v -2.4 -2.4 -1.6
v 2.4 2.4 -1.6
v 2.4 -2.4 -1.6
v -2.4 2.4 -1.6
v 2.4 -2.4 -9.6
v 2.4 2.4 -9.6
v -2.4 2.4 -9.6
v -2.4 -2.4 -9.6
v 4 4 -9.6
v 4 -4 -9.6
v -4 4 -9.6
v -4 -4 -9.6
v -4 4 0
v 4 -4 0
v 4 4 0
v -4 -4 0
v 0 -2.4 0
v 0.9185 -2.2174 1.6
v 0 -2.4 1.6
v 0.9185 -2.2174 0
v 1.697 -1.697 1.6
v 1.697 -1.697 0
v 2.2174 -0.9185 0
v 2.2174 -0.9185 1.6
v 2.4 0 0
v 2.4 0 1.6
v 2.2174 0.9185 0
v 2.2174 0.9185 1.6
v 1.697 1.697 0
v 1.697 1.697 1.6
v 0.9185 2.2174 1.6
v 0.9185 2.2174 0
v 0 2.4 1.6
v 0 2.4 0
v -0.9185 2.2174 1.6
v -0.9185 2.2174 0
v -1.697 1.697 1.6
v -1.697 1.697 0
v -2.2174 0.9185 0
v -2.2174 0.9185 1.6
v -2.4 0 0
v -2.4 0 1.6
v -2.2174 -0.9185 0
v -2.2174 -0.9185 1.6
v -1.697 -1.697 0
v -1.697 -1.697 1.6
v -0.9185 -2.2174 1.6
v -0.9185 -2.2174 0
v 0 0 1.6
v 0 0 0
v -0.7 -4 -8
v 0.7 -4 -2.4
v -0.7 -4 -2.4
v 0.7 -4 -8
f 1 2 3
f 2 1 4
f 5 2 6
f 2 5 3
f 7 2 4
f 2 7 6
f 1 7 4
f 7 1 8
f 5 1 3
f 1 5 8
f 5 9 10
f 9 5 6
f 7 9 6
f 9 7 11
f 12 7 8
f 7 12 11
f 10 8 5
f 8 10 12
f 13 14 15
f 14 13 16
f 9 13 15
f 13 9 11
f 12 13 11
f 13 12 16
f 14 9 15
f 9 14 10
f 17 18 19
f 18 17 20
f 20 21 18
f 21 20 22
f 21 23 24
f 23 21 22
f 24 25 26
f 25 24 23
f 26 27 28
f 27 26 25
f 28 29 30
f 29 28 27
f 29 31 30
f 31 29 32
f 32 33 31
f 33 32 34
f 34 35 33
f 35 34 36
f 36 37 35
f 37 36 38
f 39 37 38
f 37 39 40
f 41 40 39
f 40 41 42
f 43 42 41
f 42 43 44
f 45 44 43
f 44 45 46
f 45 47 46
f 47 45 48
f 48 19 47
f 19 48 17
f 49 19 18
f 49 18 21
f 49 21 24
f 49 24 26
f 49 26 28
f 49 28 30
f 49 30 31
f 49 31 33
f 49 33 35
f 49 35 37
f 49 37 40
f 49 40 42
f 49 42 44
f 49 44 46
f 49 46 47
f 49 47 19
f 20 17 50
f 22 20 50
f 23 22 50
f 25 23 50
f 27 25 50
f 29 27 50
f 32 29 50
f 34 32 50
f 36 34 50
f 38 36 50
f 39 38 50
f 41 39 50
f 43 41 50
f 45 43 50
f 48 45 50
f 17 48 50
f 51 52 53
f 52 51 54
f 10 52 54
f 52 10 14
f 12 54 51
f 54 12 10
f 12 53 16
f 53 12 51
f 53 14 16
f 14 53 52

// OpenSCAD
// file: ../p/4-4edge.scad
use <../lib.scad>
function ldraw_lib__4_4edge() = [
// 0 Circle 1.0
// 0 Name: 4-4edge.dat
// 0 Author: James Jessiman
// 0 !LDRAW_ORG Primitive UPDATE 2017-01
// 0 !LICENSE Licensed under CC BY 2.0 and CC BY 4.0 : see CAreadme.txt
// 
// 0 BFC CERTIFY CCW
  [0,"BFC","CERTIFY"],
  [0,"BFC","CCW"],
// 
// 0 !HISTORY 1998-12-15 [PTadmin] Official Update 1998-10
// 0 !HISTORY 2005-12-28 [PTadmin] Official Update 2005-01
// 0 !HISTORY 2007-06-24 [PTadmin] Header formatted for Contributor Agreement
// 0 !HISTORY 2008-07-01 [PTadmin] Official Update 2008-01
// 0 !HISTORY 2017-01-15 [Steffen] BFCed
// 0 !HISTORY 2017-12-30 [PTadmin] Official Update 2017-01
// 
// 
// 2 24 1 0 0 0.9239 0 0.3827
  [2,24,1,0,0,0.9239,0,0.3827],
// 2 24 0.9239 0 0.3827 0.7071 0 0.7071
  [2,24,0.9239,0,0.3827,0.7071,0,0.7071],
// 2 24 0.7071 0 0.7071 0.3827 0 0.9239
  [2,24,0.7071,0,0.7071,0.3827,0,0.9239],
// 2 24 0.3827 0 0.9239 0 0 1
  [2,24,0.3827,0,0.9239,0,0,1],
// 2 24 0 0 1 -0.3827 0 0.9239
  [2,24,0,0,1,-0.3827,0,0.9239],
// 2 24 -0.3827 0 0.9239 -0.7071 0 0.7071
  [2,24,-0.3827,0,0.9239,-0.7071,0,0.7071],
// 2 24 -0.7071 0 0.7071 -0.9239 0 0.3827
  [2,24,-0.7071,0,0.7071,-0.9239,0,0.3827],
// 2 24 -0.9239 0 0.3827 -1 0 -0
  [2,24,-0.9239,0,0.3827,-1,0,-0],
// 2 24 -1 0 -0 -0.9239 0 -0.3827
  [2,24,-1,0,-0,-0.9239,0,-0.3827],
// 2 24 -0.9239 0 -0.3827 -0.7071 0 -0.7071
  [2,24,-0.9239,0,-0.3827,-0.7071,0,-0.7071],
// 2 24 -0.7071 0 -0.7071 -0.3827 0 -0.9239
  [2,24,-0.7071,0,-0.7071,-0.3827,0,-0.9239],
// 2 24 -0.3827 0 -0.9239 0 0 -1
  [2,24,-0.3827,0,-0.9239,0,0,-1],
// 2 24 0 0 -1 0.3827 0 -0.9239
  [2,24,0,0,-1,0.3827,0,-0.9239],
// 2 24 0.3827 0 -0.9239 0.7071 0 -0.7071
  [2,24,0.3827,0,-0.9239,0.7071,0,-0.7071],
// 2 24 0.7071 0 -0.7071 0.9239 0 -0.3827
  [2,24,0.7071,0,-0.7071,0.9239,0,-0.3827],
// 2 24 0.9239 0 -0.3827 1 0 0
  [2,24,0.9239,0,-0.3827,1,0,0],
];
module ldraw_lib__4_4edge(step=0, col=false, unit=2/5, alt=false, line=0.2, solid=!$preview)
    makepoly(ldraw_lib__4_4edge(), step=step, col=col, unit=unit, alt=alt, line=line, solid=solid);
ldraw_lib__4_4edge(line=0.2);
// file: ../p/4-4disc.scad
use <../lib.scad>
function ldraw_lib__4_4disc() = [
// 0 Disc 1.0
// 0 Name: 4-4disc.dat
// 0 Author: James Jessiman
// 0 !LDRAW_ORG Primitive UPDATE 2002-02
// 0 !LICENSE Licensed under CC BY 2.0 and CC BY 4.0 : see CAreadme.txt
// 
// 0 BFC CERTIFY CCW
  [0,"BFC","CERTIFY"],
  [0,"BFC","CCW"],
// 
// 0 !HISTORY 1998-12-15 [PTadmin] Official Update 1998-10
// 0 !HISTORY 2002-03-23 [sbliss] Added BFC statement
// 0 !HISTORY 2002-04-25 [PTadmin] Official Update 2002-02
// 0 !HISTORY 2007-06-24 [PTadmin] Header formatted for Contributor Agreement
// 0 !HISTORY 2008-07-01 [PTadmin] Official Update 2008-01
// 
// 
// 3 16 0 0 0 1 0 0 0.9239 0 0.3827
  [3,16,0,0,0,1,0,0,0.9239,0,0.3827],
// 3 16 0 0 0 0.9239 0 0.3827 0.7071 0 0.7071
  [3,16,0,0,0,0.9239,0,0.3827,0.7071,0,0.7071],
// 3 16 0 0 0 0.7071 0 0.7071 0.3827 0 0.9239
  [3,16,0,0,0,0.7071,0,0.7071,0.3827,0,0.9239],
// 3 16 0 0 0 0.3827 0 0.9239 0 0 1
  [3,16,0,0,0,0.3827,0,0.9239,0,0,1],
// 3 16 0 0 0 0 0 1 -0.3827 0 0.9239
  [3,16,0,0,0,0,0,1,-0.3827,0,0.9239],
// 3 16 0 0 0 -0.3827 0 0.9239 -0.7071 0 0.7071
  [3,16,0,0,0,-0.3827,0,0.9239,-0.7071,0,0.7071],
// 3 16 0 0 0 -0.7071 0 0.7071 -0.9239 0 0.3827
  [3,16,0,0,0,-0.7071,0,0.7071,-0.9239,0,0.3827],
// 3 16 0 0 0 -0.9239 0 0.3827 -1 0 -0
  [3,16,0,0,0,-0.9239,0,0.3827,-1,0,-0],
// 3 16 0 0 0 -1 0 -0 -0.9239 0 -0.3827
  [3,16,0,0,0,-1,0,-0,-0.9239,0,-0.3827],
// 3 16 0 0 0 -0.9239 0 -0.3827 -0.7071 0 -0.7071
  [3,16,0,0,0,-0.9239,0,-0.3827,-0.7071,0,-0.7071],
// 3 16 0 0 0 -0.7071 0 -0.7071 -0.3827 0 -0.9239
  [3,16,0,0,0,-0.7071,0,-0.7071,-0.3827,0,-0.9239],
// 3 16 0 0 0 -0.3827 0 -0.9239 0 0 -1
  [3,16,0,0,0,-0.3827,0,-0.9239,0,0,-1],
// 3 16 0 0 0 0 0 -1 0.3827 0 -0.9239
  [3,16,0,0,0,0,0,-1,0.3827,0,-0.9239],
// 3 16 0 0 0 0.3827 0 -0.9239 0.7071 0 -0.7071
  [3,16,0,0,0,0.3827,0,-0.9239,0.7071,0,-0.7071],
// 3 16 0 0 0 0.7071 0 -0.7071 0.9239 0 -0.3827
  [3,16,0,0,0,0.7071,0,-0.7071,0.9239,0,-0.3827],
// 3 16 0 0 0 0.9239 0 -0.3827 1 0 0
  [3,16,0,0,0,0.9239,0,-0.3827,1,0,0],
// 0
];
module ldraw_lib__4_4disc(step=0, col=false, unit=2/5, alt=false, line=0.2, solid=!$preview)
    makepoly(ldraw_lib__4_4disc(), step=step, col=col, unit=unit, alt=alt, line=line, solid=solid);
ldraw_lib__4_4disc(line=0.2);
// file: ../p/4-4cyli.scad
use <../lib.scad>
$fa=1; $fs=0.2;
function ldraw_lib__4_4cyli(realsolid=false) = [
// 0 Cylinder 1.0
// 0 Name: 4-4cyli.dat
// 0 Author: James Jessiman
// 0 !LDRAW_ORG Primitive UPDATE 2005-01
// 0 !LICENSE Licensed under CC BY 2.0 and CC BY 4.0 : see CAreadme.txt
// 
// 0 BFC CERTIFY CCW
  [0,"BFC","CERTIFY"],
  [0,"BFC","CCW"],
// 
// 0 !HISTORY 1998-12-15 [PTadmin] Official Update 1998-10
// 0 !HISTORY 2002-03-23 [sbliss] Added BFC statement; merged headers from files in distributions LDraw 0.27 and Complete.
// 0 !HISTORY 2002-04-25 [PTadmin] Official Update 2002-02
// 0 !HISTORY 2004-12-14 [guyvivan] BFC CCW
// 0 !HISTORY 2005-12-28 [PTadmin] Official Update 2005-01
// 0 !HISTORY 2007-06-24 [PTadmin] Header formatted for Contributor Agreement
// 0 !HISTORY 2008-07-01 [PTadmin] Official Update 2008-01
// 
// 
// 4 16 1 1 0 0.9239 1 0.3827 0.9239 0 0.3827 1 0 0
  [4,16,1,1,0,0.9239,1,0.3827,0.9239,0,0.3827,1,0,0],
// 5 24 1 0 0 1 1 0 0.9239 0 0.3827 0.9239 0 -0.3827
  [5,24,1,0,0,1,1,0,0.9239,0,0.3827,0.9239,0,-0.3827],
// 4 16 0.9239 1 0.3827 0.7071 1 0.7071 0.7071 0 0.7071 0.9239 0 0.3827
  [4,16,0.9239,1,0.3827,0.7071,1,0.7071,0.7071,0,0.7071,0.9239,0,0.3827],
// 5 24 0.9239 0 0.3827 0.9239 1 0.3827 0.7071 0 0.7071 1 0 0
  [5,24,0.9239,0,0.3827,0.9239,1,0.3827,0.7071,0,0.7071,1,0,0],
// 4 16 0.7071 1 0.7071 0.3827 1 0.9239 0.3827 0 0.9239 0.7071 0 0.7071
  [4,16,0.7071,1,0.7071,0.3827,1,0.9239,0.3827,0,0.9239,0.7071,0,0.7071],
// 5 24 0.7071 0 0.7071 0.7071 1 0.7071 0.3827 0 0.9239 0.9239 0 0.3827
  [5,24,0.7071,0,0.7071,0.7071,1,0.7071,0.3827,0,0.9239,0.9239,0,0.3827],
// 4 16 0.3827 1 0.9239 0 1 1 0 0 1 0.3827 0 0.9239
  [4,16,0.3827,1,0.9239,0,1,1,0,0,1,0.3827,0,0.9239],
// 5 24 0.3827 0 0.9239 0.3827 1 0.9239 0 0 1 0.7071 0 0.7071
  [5,24,0.3827,0,0.9239,0.3827,1,0.9239,0,0,1,0.7071,0,0.7071],
// 4 16 0 1 1 -0.3827 1 0.9239 -0.3827 0 0.9239 0 0 1
  [4,16,0,1,1,-0.3827,1,0.9239,-0.3827,0,0.9239,0,0,1],
// 5 24 0 0 1 0 1 1 -0.3827 0 0.9239 0.3827 0 0.9239
  [5,24,0,0,1,0,1,1,-0.3827,0,0.9239,0.3827,0,0.9239],
// 4 16 -0.3827 1 0.9239 -0.7071 1 0.7071 -0.7071 0 0.7071 -0.3827 0 0.9239
  [4,16,-0.3827,1,0.9239,-0.7071,1,0.7071,-0.7071,0,0.7071,-0.3827,0,0.9239],
// 5 24 -0.3827 0 0.9239 -0.3827 1 0.9239 -0.7071 0 0.7071 0 0 1
  [5,24,-0.3827,0,0.9239,-0.3827,1,0.9239,-0.7071,0,0.7071,0,0,1],
// 4 16 -0.7071 1 0.7071 -0.9239 1 0.3827 -0.9239 0 0.3827 -0.7071 0 0.7071
  [4,16,-0.7071,1,0.7071,-0.9239,1,0.3827,-0.9239,0,0.3827,-0.7071,0,0.7071],
// 5 24 -0.7071 0 0.7071 -0.7071 1 0.7071 -0.9239 0 0.3827 -0.3827 0 0.9239
  [5,24,-0.7071,0,0.7071,-0.7071,1,0.7071,-0.9239,0,0.3827,-0.3827,0,0.9239],
// 4 16 -0.9239 1 0.3827 -1 1 0 -1 0 0 -0.9239 0 0.3827
  [4,16,-0.9239,1,0.3827,-1,1,0,-1,0,0,-0.9239,0,0.3827],
// 5 24 -0.9239 0 0.3827 -0.9239 1 0.3827 -1 0 0 -0.7071 0 0.7071
  [5,24,-0.9239,0,0.3827,-0.9239,1,0.3827,-1,0,0,-0.7071,0,0.7071],
// 4 16 -1 1 0 -0.9239 1 -0.3827 -0.9239 0 -0.3827 -1 0 0
  [4,16,-1,1,0,-0.9239,1,-0.3827,-0.9239,0,-0.3827,-1,0,0],
// 5 24 -1 0 0 -1 1 0 -0.9239 0 -0.3827 -0.9239 0 0.3827
  [5,24,-1,0,0,-1,1,0,-0.9239,0,-0.3827,-0.9239,0,0.3827],
// 4 16 -0.9239 1 -0.3827 -0.7071 1 -0.7071 -0.7071 0 -0.7071 -0.9239 0 -0.3827
  [4,16,-0.9239,1,-0.3827,-0.7071,1,-0.7071,-0.7071,0,-0.7071,-0.9239,0,-0.3827],
// 5 24 -0.9239 0 -0.3827 -0.9239 1 -0.3827 -0.7071 0 -0.7071 -1 0 0
  [5,24,-0.9239,0,-0.3827,-0.9239,1,-0.3827,-0.7071,0,-0.7071,-1,0,0],
// 4 16 -0.7071 1 -0.7071 -0.3827 1 -0.9239 -0.3827 0 -0.9239 -0.7071 0 -0.7071
  [4,16,-0.7071,1,-0.7071,-0.3827,1,-0.9239,-0.3827,0,-0.9239,-0.7071,0,-0.7071],
// 5 24 -0.7071 0 -0.7071 -0.7071 1 -0.7071 -0.3827 0 -0.9239 -0.9239 0 -0.3827
  [5,24,-0.7071,0,-0.7071,-0.7071,1,-0.7071,-0.3827,0,-0.9239,-0.9239,0,-0.3827],
// 4 16 -0.3827 1 -0.9239 0 1 -1 0 0 -1 -0.3827 0 -0.9239
  [4,16,-0.3827,1,-0.9239,0,1,-1,0,0,-1,-0.3827,0,-0.9239],
// 5 24 -0.3827 0 -0.9239 -0.3827 1 -0.9239 0 0 -1 -0.7071 0 -0.7071
  [5,24,-0.3827,0,-0.9239,-0.3827,1,-0.9239,0,0,-1,-0.7071,0,-0.7071],
// 4 16 0 1 -1 0.3827 1 -0.9239 0.3827 0 -0.9239 0 0 -1
  [4,16,0,1,-1,0.3827,1,-0.9239,0.3827,0,-0.9239,0,0,-1],
// 5 24 0 0 -1 0 1 -1 0.3827 0 -0.9239 -0.3827 0 -0.9239
  [5,24,0,0,-1,0,1,-1,0.3827,0,-0.9239,-0.3827,0,-0.9239],
// 4 16 0.3827 1 -0.9239 0.7071 1 -0.7071 0.7071 0 -0.7071 0.3827 0 -0.9239
  [4,16,0.3827,1,-0.9239,0.7071,1,-0.7071,0.7071,0,-0.7071,0.3827,0,-0.9239],
// 5 24 0.3827 0 -0.9239 0.3827 1 -0.9239 0.7071 0 -0.7071 0 0 -1
  [5,24,0.3827,0,-0.9239,0.3827,1,-0.9239,0.7071,0,-0.7071,0,0,-1],
// 4 16 0.7071 1 -0.7071 0.9239 1 -0.3827 0.9239 0 -0.3827 0.7071 0 -0.7071
  [4,16,0.7071,1,-0.7071,0.9239,1,-0.3827,0.9239,0,-0.3827,0.7071,0,-0.7071],
// 5 24 0.7071 0 -0.7071 0.7071 1 -0.7071 0.9239 0 -0.3827 0.3827 0 -0.9239
  [5,24,0.7071,0,-0.7071,0.7071,1,-0.7071,0.9239,0,-0.3827,0.3827,0,-0.9239],
// 4 16 0.9239 1 -0.3827 1 1 0 1 0 0 0.9239 0 -0.3827
  [4,16,0.9239,1,-0.3827,1,1,0,1,0,0,0.9239,0,-0.3827],
// 5 24 0.9239 0 -0.3827 0.9239 1 -0.3827 1 0 0 0.7071 0 -0.7071
  [5,24,0.9239,0,-0.3827,0.9239,1,-0.3827,1,0,0,0.7071,0,-0.7071],
// 0
];
module ldraw_lib__4_4cyli(step=0, col=false, unit=2/5, alt=false, line=0.2, solid=!$preview)
    makepoly(ldraw_lib__4_4cyli(solid), step=step, col=col, unit=unit, alt=alt, line=line, solid=solid);
ldraw_lib__4_4cyli(line=0.2);
// file: ../p/stud.scad
use <../lib.scad>
use <4-4cyli.scad>
use <4-4disc.scad>
use <4-4edge.scad>
function ldraw_lib__stud() = [
// 0 Stud
// 0 Name: stud.dat
// 0 Author: James Jessiman
// 0 !LDRAW_ORG Primitive UPDATE 2012-01
// 0 !LICENSE Licensed under CC BY 4.0 : see CAreadme.txt
// 
// 0 BFC CERTIFY CCW
  [0,"BFC","CERTIFY"],
  [0,"BFC","CCW"],
// 
// 0 !HISTORY 2002-04-04 [sbliss] Modified for BFC compliance
// 0 !HISTORY 2002-04-25 [PTadmin] Official Update 2002-02
// 0 !HISTORY 2007-06-24 [PTadmin] Header formatted for Contributor Agreement
// 0 !HISTORY 2008-07-01 [PTadmin] Official Update 2008-01
// 0 !HISTORY 2012-02-16 [Philo] Changed to CCW
// 0 !HISTORY 2012-03-30 [PTadmin] Official Update 2012-01
// 
// 
// 1 16 0 0 0 6 0 0 0 1 0 0 0 6 4-4edge.dat
  [1,16,0,0,0,6,0,0,0,1,0,0,0,6, ldraw_lib__4_4edge()],
// 1 16 0 -4 0 6 0 0 0 1 0 0 0 6 4-4edge.dat
  [1,16,0,-4,0,6,0,0,0,1,0,0,0,6, ldraw_lib__4_4edge()],
// 1 16 0 0 0 6 0 0 0 -4 0 0 0 6 4-4cyli.dat
  [1,16,0,0,0,6,0,0,0,-4,0,0,0,6, ldraw_lib__4_4cyli()],
// 1 16 0 -4 0 6 0 0 0 1 0 0 0 6 4-4disc.dat
  [1,16,0,-4,0,6,0,0,0,1,0,0,0,6, ldraw_lib__4_4disc()],
  [-1,16,0,0,0,6,0,0,0,-1,0,0,0,6, ldraw_lib__4_4disc()],
];
module ldraw_lib__stud(step=0, col=false, unit=2/5, alt=false, line=0.2, solid=!$preview)
    makepoly(ldraw_lib__stud(), step=step, col=col, unit=unit, alt=alt, line=line, solid=solid);
ldraw_lib__stud(line=0.2);
// file: ../p/box5.scad
use <../lib.scad>
function ldraw_lib__box5() = [
// 0 Box with 5 Faces and All Edges
// 0 Name: box5.dat
// 0 Author: James Jessiman
// 0 !LDRAW_ORG Primitive UPDATE 2012-01
// 0 !LICENSE Licensed under CC BY 2.0 and CC BY 4.0 : see CAreadme.txt
// 
// 0 BFC CERTIFY CCW
  [0,"BFC","CERTIFY"],
  [0,"BFC","CCW"],
// 
// 0 !HISTORY 2002-04-03 [sbliss] Modified for BFC compliance
// 0 !HISTORY 2002-04-25 [PTadmin] Official Update 2002-02
// 0 !HISTORY 2007-06-24 [PTadmin] Header formatted for Contributor Agreement
// 0 !HISTORY 2008-07-01 [PTadmin] Official Update 2008-01
// 0 !HISTORY 2012-02-16 [Philo] Changed to CCW
// 0 !HISTORY 2012-03-30 [PTadmin] Official Update 2012-01
// 
// 
// 2 24 1 1 1 -1 1 1
  [2,24,1,1,1,-1,1,1],
// 2 24 -1 1 1 -1 1 -1
  [2,24,-1,1,1,-1,1,-1],
// 2 24 -1 1 -1 1 1 -1
  [2,24,-1,1,-1,1,1,-1],
// 2 24 1 1 -1 1 1 1
  [2,24,1,1,-1,1,1,1],
// 2 24 1 0 1 -1 0 1
  [2,24,1,0,1,-1,0,1],
// 2 24 -1 0 1 -1 0 -1
  [2,24,-1,0,1,-1,0,-1],
// 2 24 -1 0 -1 1 0 -1
  [2,24,-1,0,-1,1,0,-1],
// 2 24 1 0 -1 1 0 1
  [2,24,1,0,-1,1,0,1],
// 2 24 1 0 1 1 1 1
  [2,24,1,0,1,1,1,1],
// 2 24 -1 0 1 -1 1 1
  [2,24,-1,0,1,-1,1,1],
// 2 24 1 0 -1 1 1 -1
  [2,24,1,0,-1,1,1,-1],
// 2 24 -1 0 -1 -1 1 -1
  [2,24,-1,0,-1,-1,1,-1],
// 4 16 -1 1 1 1 1 1 1 1 -1 -1 1 -1
  [4,16,-1,1,1,1,1,1,1,1,-1,-1,1,-1],
// 4 16 -1 1 1 -1 0 1 1 0 1 1 1 1
  [4,16,-1,1,1,-1,0,1,1,0,1,1,1,1],
// 4 16 -1 1 -1 -1 0 -1 -1 0 1 -1 1 1
  [4,16,-1,1,-1,-1,0,-1,-1,0,1,-1,1,1],
// 4 16 1 1 -1 1 0 -1 -1 0 -1 -1 1 -1
  [4,16,1,1,-1,1,0,-1,-1,0,-1,-1,1,-1],
// 4 16 1 1 1 1 0 1 1 0 -1 1 1 -1
  [4,16,1,1,1,1,0,1,1,0,-1,1,1,-1],
];
makepoly(ldraw_lib__box5(), line=0.2);
// file: ../p/box4t.scad
use <../lib.scad>
function ldraw_lib__box4t() = [
// 0 Box with 4 Adjacent Faces and All Edges
// 0 Name: box4t.dat
// 0 Author: Tore Eriksson [Tore_Eriksson]
// 0 !LDRAW_ORG Primitive UPDATE 2003-02
// 0 !LICENSE Licensed under CC BY 2.0 and CC BY 4.0 : see CAreadme.txt
// 
// 0 BFC CERTIFY CCW
  [0,"BFC","CERTIFY"],
  [0,"BFC","CCW"],
// 
// 0 !HISTORY 1997-09-29 [PTadmin] Official Update 1997-15
// 0 !HISTORY 2002-08-31 [izanette] Modified with WINDZ for BFC compliance
// 0 !HISTORY 2003-08-01 [PTadmin] Official Update 2003-02
// 0 !HISTORY 2007-06-24 [PTadmin] Header formatted for Contributor Agreement
// 0 !HISTORY 2008-07-01 [PTadmin] Official Update 2008-01
// 
// 
// 2 24 1 1 1 -1 1 1
  [2,24,1,1,1,-1,1,1],
// 2 24 -1 1 1 -1 1 -1
  [2,24,-1,1,1,-1,1,-1],
// 2 24 -1 1 -1 1 1 -1
  [2,24,-1,1,-1,1,1,-1],
// 2 24 1 1 -1 1 1 1
  [2,24,1,1,-1,1,1,1],
// 2 24 1 0 1 -1 0 1
  [2,24,1,0,1,-1,0,1],
// 2 24 -1 0 1 -1 0 -1
  [2,24,-1,0,1,-1,0,-1],
// 2 24 -1 0 -1 1 0 -1
  [2,24,-1,0,-1,1,0,-1],
// 2 24 1 0 -1 1 0 1
  [2,24,1,0,-1,1,0,1],
// 2 24 1 0 1 1 1 1
  [2,24,1,0,1,1,1,1],
// 2 24 -1 0 1 -1 1 1
  [2,24,-1,0,1,-1,1,1],
// 2 24 1 0 -1 1 1 -1
  [2,24,1,0,-1,1,1,-1],
// 2 24 -1 0 -1 -1 1 -1
  [2,24,-1,0,-1,-1,1,-1],
// 4 16 1 1 1 1 1 -1 -1 1 -1 -1 1 1
  [4,16,1,1,1,1,1,-1,-1,1,-1,-1,1,1],
// 4 16 1 1 1 -1 1 1 -1 0 1 1 0 1
  [4,16,1,1,1,-1,1,1,-1,0,1,1,0,1],
// 4 16 -1 1 1 -1 1 -1 -1 0 -1 -1 0 1
  [4,16,-1,1,1,-1,1,-1,-1,0,-1,-1,0,1],
// 0 4 16 -1 1 -1 -1 0 -1 1 0 -1 1 1 -1
// 4 16 1 1 -1 1 1 1 1 0 1 1 0 -1
  [4,16,1,1,-1,1,1,1,1,0,1,1,0,-1],
// 0
];
makepoly(ldraw_lib__box4t(), line=0.2);
// file: s/3005s01.scad
use <../../lib.scad>
use <../../p/box4t.scad>
use <../../p/box5.scad>
use <../../p/stud.scad>
function ldraw_lib__s__3005s01() = [
// 0 ~Brick  1 x  1 without Front Face
// 0 Name: s\3005s01.dat
// 0 Author: John Riley [jriley]
// 0 !LDRAW_ORG Subpart UPDATE 2004-01
// 0 !LICENSE Licensed under CC BY 2.0 and CC BY 4.0 : see CAreadme.txt
// 
// 0 BFC CERTIFY CCW
  [0,"BFC","CERTIFY"],
  [0,"BFC","CCW"],
// 
// 0 !HISTORY 2003-09-07 [jriley] BFCed & Subfiled
// 0 !HISTORY 2004-03-02 [PTadmin] Official Update 2004-01
// 0 !HISTORY 2007-08-29 [PTadmin] Header formatted for Contributor Agreement
// 0 !HISTORY 2008-07-01 [PTadmin] Official Update 2008-01
// 
// 
// 0 BFC INVERTNEXT
  [0,"BFC","INVERTNEXT"],
// 1 16 0 24 0 0 0 6 0 -20 0 -6 0 0 box5.dat
  [1,16,0,24,0,0,0,6,0,-20,0,-6,0,0, ldraw_lib__box5()],
// 4 16 10 24 -10 6 24 -6 6 24 6 10 24 10
  [4,16,10,24,-10,6,24,-6,6,24,6,10,24,10],
// 4 16 10 24 10 6 24 6 -6 24 6 -10 24 10
  [4,16,10,24,10,6,24,6,-6,24,6,-10,24,10],
// 4 16 -10 24 10 -6 24 6 -6 24 -6 -10 24 -10
  [4,16,-10,24,10,-6,24,6,-6,24,-6,-10,24,-10],
// 4 16 -10 24 -10 -6 24 -6 6 24 -6 10 24 -10
  [4,16,-10,24,-10,-6,24,-6,6,24,-6,10,24,-10],
// 1 16 0 24 0 10 0 0 0 -24 0 0 0 10 box4t.dat
  [1,16,0,24,0,10,0,0,0,-24,0,0,0,10, ldraw_lib__box4t()],
// 1 16 0 0 0 0 0 1 0 1 0 -1 0 0 stud.dat
  [1,16,0,0,0,0,0,1,0,1,0,-1,0,0, ldraw_lib__stud()],
// 0
];
module ldraw_lib__s__3005s01(step=0, col=false, unit=2/5, alt=false, line=0.2, solid=!$preview)
    makepoly(ldraw_lib__s__3005s01(), step=step, col=col, unit=unit, alt=alt, line=line, solid=solid);
ldraw_lib__s__3005s01(line=0.2);
// main file
use <../lib.scad>
use <s/3005s01.scad>
function ldraw_lib__3005pvi() = [
// 0 Brick  1 x  1 with Lightblue "I" Pattern
// 0 Name: 3005pvi.dat
// 0 Author: Tore Eriksson [Tore_Eriksson]
// 0 !LDRAW_ORG Part UPDATE 2004-02
// 0 !LICENSE Licensed under CC BY 4.0 : see CAreadme.txt
// 
// 0 BFC CERTIFY CW
  [0,"BFC","CERTIFY"],
  [0,"BFC","CW"],
// 
// 0 !KEYWORDS BrickLink 3005ptIb, letters, numbers, Rebrickable 3005pr9942
// 0 !KEYWORDS Set 988
// 
// 0 !HISTORY 2004-04-22 [PTadmin] Official Update 2004-02
// 0 !HISTORY 2007-05-11 [PTadmin] Header formatted for Contributor Agreement
// 0 !HISTORY 2008-07-01 [PTadmin] Official Update 2008-01
// 
// 
// 1 16 0 0 0 1 0 0 0 1 0 0 0 1 s\3005s01.dat
  [1,16,0,0,0,1,0,0,0,1,0,0,0,1, ldraw_lib__s__3005s01()],
// 
// 4 9 -1.75 6 -10 1.75 6 -10 1.75 20 -10 -1.75 20 -10
  [4,9,-1.75,6,-10,1.75,6,-10,1.75,20,-10,-1.75,20,-10],
// 4 16 10 24 -10 1.75 20 -10 1.75 6 -10 10 0 -10
  [4,16,10,24,-10,1.75,20,-10,1.75,6,-10,10,0,-10],
// 4 16 -10 24 -10 -1.75 20 -10 1.75 20 -10 10 24 -10
  [4,16,-10,24,-10,-1.75,20,-10,1.75,20,-10,10,24,-10],
// 4 16 -10 0 -10 -1.75 6 -10 -1.75 20 -10 -10 24 -10
  [4,16,-10,0,-10,-1.75,6,-10,-1.75,20,-10,-10,24,-10],
// 4 16 -10 0 -10 10 0 -10 1.75 6 -10 -1.75 6 -10
  [4,16,-10,0,-10,10,0,-10,1.75,6,-10,-1.75,6,-10],
// 0
];
module ldraw_lib__3005pvi(step=0, col=false, unit=2/5, alt=false, line=0.2, solid=!$preview)
    makepoly(ldraw_lib__3005pvi(), step=step, col=col, unit=unit, alt=alt, line=line, solid=solid);
ldraw_lib__3005pvi(line=0.2);
